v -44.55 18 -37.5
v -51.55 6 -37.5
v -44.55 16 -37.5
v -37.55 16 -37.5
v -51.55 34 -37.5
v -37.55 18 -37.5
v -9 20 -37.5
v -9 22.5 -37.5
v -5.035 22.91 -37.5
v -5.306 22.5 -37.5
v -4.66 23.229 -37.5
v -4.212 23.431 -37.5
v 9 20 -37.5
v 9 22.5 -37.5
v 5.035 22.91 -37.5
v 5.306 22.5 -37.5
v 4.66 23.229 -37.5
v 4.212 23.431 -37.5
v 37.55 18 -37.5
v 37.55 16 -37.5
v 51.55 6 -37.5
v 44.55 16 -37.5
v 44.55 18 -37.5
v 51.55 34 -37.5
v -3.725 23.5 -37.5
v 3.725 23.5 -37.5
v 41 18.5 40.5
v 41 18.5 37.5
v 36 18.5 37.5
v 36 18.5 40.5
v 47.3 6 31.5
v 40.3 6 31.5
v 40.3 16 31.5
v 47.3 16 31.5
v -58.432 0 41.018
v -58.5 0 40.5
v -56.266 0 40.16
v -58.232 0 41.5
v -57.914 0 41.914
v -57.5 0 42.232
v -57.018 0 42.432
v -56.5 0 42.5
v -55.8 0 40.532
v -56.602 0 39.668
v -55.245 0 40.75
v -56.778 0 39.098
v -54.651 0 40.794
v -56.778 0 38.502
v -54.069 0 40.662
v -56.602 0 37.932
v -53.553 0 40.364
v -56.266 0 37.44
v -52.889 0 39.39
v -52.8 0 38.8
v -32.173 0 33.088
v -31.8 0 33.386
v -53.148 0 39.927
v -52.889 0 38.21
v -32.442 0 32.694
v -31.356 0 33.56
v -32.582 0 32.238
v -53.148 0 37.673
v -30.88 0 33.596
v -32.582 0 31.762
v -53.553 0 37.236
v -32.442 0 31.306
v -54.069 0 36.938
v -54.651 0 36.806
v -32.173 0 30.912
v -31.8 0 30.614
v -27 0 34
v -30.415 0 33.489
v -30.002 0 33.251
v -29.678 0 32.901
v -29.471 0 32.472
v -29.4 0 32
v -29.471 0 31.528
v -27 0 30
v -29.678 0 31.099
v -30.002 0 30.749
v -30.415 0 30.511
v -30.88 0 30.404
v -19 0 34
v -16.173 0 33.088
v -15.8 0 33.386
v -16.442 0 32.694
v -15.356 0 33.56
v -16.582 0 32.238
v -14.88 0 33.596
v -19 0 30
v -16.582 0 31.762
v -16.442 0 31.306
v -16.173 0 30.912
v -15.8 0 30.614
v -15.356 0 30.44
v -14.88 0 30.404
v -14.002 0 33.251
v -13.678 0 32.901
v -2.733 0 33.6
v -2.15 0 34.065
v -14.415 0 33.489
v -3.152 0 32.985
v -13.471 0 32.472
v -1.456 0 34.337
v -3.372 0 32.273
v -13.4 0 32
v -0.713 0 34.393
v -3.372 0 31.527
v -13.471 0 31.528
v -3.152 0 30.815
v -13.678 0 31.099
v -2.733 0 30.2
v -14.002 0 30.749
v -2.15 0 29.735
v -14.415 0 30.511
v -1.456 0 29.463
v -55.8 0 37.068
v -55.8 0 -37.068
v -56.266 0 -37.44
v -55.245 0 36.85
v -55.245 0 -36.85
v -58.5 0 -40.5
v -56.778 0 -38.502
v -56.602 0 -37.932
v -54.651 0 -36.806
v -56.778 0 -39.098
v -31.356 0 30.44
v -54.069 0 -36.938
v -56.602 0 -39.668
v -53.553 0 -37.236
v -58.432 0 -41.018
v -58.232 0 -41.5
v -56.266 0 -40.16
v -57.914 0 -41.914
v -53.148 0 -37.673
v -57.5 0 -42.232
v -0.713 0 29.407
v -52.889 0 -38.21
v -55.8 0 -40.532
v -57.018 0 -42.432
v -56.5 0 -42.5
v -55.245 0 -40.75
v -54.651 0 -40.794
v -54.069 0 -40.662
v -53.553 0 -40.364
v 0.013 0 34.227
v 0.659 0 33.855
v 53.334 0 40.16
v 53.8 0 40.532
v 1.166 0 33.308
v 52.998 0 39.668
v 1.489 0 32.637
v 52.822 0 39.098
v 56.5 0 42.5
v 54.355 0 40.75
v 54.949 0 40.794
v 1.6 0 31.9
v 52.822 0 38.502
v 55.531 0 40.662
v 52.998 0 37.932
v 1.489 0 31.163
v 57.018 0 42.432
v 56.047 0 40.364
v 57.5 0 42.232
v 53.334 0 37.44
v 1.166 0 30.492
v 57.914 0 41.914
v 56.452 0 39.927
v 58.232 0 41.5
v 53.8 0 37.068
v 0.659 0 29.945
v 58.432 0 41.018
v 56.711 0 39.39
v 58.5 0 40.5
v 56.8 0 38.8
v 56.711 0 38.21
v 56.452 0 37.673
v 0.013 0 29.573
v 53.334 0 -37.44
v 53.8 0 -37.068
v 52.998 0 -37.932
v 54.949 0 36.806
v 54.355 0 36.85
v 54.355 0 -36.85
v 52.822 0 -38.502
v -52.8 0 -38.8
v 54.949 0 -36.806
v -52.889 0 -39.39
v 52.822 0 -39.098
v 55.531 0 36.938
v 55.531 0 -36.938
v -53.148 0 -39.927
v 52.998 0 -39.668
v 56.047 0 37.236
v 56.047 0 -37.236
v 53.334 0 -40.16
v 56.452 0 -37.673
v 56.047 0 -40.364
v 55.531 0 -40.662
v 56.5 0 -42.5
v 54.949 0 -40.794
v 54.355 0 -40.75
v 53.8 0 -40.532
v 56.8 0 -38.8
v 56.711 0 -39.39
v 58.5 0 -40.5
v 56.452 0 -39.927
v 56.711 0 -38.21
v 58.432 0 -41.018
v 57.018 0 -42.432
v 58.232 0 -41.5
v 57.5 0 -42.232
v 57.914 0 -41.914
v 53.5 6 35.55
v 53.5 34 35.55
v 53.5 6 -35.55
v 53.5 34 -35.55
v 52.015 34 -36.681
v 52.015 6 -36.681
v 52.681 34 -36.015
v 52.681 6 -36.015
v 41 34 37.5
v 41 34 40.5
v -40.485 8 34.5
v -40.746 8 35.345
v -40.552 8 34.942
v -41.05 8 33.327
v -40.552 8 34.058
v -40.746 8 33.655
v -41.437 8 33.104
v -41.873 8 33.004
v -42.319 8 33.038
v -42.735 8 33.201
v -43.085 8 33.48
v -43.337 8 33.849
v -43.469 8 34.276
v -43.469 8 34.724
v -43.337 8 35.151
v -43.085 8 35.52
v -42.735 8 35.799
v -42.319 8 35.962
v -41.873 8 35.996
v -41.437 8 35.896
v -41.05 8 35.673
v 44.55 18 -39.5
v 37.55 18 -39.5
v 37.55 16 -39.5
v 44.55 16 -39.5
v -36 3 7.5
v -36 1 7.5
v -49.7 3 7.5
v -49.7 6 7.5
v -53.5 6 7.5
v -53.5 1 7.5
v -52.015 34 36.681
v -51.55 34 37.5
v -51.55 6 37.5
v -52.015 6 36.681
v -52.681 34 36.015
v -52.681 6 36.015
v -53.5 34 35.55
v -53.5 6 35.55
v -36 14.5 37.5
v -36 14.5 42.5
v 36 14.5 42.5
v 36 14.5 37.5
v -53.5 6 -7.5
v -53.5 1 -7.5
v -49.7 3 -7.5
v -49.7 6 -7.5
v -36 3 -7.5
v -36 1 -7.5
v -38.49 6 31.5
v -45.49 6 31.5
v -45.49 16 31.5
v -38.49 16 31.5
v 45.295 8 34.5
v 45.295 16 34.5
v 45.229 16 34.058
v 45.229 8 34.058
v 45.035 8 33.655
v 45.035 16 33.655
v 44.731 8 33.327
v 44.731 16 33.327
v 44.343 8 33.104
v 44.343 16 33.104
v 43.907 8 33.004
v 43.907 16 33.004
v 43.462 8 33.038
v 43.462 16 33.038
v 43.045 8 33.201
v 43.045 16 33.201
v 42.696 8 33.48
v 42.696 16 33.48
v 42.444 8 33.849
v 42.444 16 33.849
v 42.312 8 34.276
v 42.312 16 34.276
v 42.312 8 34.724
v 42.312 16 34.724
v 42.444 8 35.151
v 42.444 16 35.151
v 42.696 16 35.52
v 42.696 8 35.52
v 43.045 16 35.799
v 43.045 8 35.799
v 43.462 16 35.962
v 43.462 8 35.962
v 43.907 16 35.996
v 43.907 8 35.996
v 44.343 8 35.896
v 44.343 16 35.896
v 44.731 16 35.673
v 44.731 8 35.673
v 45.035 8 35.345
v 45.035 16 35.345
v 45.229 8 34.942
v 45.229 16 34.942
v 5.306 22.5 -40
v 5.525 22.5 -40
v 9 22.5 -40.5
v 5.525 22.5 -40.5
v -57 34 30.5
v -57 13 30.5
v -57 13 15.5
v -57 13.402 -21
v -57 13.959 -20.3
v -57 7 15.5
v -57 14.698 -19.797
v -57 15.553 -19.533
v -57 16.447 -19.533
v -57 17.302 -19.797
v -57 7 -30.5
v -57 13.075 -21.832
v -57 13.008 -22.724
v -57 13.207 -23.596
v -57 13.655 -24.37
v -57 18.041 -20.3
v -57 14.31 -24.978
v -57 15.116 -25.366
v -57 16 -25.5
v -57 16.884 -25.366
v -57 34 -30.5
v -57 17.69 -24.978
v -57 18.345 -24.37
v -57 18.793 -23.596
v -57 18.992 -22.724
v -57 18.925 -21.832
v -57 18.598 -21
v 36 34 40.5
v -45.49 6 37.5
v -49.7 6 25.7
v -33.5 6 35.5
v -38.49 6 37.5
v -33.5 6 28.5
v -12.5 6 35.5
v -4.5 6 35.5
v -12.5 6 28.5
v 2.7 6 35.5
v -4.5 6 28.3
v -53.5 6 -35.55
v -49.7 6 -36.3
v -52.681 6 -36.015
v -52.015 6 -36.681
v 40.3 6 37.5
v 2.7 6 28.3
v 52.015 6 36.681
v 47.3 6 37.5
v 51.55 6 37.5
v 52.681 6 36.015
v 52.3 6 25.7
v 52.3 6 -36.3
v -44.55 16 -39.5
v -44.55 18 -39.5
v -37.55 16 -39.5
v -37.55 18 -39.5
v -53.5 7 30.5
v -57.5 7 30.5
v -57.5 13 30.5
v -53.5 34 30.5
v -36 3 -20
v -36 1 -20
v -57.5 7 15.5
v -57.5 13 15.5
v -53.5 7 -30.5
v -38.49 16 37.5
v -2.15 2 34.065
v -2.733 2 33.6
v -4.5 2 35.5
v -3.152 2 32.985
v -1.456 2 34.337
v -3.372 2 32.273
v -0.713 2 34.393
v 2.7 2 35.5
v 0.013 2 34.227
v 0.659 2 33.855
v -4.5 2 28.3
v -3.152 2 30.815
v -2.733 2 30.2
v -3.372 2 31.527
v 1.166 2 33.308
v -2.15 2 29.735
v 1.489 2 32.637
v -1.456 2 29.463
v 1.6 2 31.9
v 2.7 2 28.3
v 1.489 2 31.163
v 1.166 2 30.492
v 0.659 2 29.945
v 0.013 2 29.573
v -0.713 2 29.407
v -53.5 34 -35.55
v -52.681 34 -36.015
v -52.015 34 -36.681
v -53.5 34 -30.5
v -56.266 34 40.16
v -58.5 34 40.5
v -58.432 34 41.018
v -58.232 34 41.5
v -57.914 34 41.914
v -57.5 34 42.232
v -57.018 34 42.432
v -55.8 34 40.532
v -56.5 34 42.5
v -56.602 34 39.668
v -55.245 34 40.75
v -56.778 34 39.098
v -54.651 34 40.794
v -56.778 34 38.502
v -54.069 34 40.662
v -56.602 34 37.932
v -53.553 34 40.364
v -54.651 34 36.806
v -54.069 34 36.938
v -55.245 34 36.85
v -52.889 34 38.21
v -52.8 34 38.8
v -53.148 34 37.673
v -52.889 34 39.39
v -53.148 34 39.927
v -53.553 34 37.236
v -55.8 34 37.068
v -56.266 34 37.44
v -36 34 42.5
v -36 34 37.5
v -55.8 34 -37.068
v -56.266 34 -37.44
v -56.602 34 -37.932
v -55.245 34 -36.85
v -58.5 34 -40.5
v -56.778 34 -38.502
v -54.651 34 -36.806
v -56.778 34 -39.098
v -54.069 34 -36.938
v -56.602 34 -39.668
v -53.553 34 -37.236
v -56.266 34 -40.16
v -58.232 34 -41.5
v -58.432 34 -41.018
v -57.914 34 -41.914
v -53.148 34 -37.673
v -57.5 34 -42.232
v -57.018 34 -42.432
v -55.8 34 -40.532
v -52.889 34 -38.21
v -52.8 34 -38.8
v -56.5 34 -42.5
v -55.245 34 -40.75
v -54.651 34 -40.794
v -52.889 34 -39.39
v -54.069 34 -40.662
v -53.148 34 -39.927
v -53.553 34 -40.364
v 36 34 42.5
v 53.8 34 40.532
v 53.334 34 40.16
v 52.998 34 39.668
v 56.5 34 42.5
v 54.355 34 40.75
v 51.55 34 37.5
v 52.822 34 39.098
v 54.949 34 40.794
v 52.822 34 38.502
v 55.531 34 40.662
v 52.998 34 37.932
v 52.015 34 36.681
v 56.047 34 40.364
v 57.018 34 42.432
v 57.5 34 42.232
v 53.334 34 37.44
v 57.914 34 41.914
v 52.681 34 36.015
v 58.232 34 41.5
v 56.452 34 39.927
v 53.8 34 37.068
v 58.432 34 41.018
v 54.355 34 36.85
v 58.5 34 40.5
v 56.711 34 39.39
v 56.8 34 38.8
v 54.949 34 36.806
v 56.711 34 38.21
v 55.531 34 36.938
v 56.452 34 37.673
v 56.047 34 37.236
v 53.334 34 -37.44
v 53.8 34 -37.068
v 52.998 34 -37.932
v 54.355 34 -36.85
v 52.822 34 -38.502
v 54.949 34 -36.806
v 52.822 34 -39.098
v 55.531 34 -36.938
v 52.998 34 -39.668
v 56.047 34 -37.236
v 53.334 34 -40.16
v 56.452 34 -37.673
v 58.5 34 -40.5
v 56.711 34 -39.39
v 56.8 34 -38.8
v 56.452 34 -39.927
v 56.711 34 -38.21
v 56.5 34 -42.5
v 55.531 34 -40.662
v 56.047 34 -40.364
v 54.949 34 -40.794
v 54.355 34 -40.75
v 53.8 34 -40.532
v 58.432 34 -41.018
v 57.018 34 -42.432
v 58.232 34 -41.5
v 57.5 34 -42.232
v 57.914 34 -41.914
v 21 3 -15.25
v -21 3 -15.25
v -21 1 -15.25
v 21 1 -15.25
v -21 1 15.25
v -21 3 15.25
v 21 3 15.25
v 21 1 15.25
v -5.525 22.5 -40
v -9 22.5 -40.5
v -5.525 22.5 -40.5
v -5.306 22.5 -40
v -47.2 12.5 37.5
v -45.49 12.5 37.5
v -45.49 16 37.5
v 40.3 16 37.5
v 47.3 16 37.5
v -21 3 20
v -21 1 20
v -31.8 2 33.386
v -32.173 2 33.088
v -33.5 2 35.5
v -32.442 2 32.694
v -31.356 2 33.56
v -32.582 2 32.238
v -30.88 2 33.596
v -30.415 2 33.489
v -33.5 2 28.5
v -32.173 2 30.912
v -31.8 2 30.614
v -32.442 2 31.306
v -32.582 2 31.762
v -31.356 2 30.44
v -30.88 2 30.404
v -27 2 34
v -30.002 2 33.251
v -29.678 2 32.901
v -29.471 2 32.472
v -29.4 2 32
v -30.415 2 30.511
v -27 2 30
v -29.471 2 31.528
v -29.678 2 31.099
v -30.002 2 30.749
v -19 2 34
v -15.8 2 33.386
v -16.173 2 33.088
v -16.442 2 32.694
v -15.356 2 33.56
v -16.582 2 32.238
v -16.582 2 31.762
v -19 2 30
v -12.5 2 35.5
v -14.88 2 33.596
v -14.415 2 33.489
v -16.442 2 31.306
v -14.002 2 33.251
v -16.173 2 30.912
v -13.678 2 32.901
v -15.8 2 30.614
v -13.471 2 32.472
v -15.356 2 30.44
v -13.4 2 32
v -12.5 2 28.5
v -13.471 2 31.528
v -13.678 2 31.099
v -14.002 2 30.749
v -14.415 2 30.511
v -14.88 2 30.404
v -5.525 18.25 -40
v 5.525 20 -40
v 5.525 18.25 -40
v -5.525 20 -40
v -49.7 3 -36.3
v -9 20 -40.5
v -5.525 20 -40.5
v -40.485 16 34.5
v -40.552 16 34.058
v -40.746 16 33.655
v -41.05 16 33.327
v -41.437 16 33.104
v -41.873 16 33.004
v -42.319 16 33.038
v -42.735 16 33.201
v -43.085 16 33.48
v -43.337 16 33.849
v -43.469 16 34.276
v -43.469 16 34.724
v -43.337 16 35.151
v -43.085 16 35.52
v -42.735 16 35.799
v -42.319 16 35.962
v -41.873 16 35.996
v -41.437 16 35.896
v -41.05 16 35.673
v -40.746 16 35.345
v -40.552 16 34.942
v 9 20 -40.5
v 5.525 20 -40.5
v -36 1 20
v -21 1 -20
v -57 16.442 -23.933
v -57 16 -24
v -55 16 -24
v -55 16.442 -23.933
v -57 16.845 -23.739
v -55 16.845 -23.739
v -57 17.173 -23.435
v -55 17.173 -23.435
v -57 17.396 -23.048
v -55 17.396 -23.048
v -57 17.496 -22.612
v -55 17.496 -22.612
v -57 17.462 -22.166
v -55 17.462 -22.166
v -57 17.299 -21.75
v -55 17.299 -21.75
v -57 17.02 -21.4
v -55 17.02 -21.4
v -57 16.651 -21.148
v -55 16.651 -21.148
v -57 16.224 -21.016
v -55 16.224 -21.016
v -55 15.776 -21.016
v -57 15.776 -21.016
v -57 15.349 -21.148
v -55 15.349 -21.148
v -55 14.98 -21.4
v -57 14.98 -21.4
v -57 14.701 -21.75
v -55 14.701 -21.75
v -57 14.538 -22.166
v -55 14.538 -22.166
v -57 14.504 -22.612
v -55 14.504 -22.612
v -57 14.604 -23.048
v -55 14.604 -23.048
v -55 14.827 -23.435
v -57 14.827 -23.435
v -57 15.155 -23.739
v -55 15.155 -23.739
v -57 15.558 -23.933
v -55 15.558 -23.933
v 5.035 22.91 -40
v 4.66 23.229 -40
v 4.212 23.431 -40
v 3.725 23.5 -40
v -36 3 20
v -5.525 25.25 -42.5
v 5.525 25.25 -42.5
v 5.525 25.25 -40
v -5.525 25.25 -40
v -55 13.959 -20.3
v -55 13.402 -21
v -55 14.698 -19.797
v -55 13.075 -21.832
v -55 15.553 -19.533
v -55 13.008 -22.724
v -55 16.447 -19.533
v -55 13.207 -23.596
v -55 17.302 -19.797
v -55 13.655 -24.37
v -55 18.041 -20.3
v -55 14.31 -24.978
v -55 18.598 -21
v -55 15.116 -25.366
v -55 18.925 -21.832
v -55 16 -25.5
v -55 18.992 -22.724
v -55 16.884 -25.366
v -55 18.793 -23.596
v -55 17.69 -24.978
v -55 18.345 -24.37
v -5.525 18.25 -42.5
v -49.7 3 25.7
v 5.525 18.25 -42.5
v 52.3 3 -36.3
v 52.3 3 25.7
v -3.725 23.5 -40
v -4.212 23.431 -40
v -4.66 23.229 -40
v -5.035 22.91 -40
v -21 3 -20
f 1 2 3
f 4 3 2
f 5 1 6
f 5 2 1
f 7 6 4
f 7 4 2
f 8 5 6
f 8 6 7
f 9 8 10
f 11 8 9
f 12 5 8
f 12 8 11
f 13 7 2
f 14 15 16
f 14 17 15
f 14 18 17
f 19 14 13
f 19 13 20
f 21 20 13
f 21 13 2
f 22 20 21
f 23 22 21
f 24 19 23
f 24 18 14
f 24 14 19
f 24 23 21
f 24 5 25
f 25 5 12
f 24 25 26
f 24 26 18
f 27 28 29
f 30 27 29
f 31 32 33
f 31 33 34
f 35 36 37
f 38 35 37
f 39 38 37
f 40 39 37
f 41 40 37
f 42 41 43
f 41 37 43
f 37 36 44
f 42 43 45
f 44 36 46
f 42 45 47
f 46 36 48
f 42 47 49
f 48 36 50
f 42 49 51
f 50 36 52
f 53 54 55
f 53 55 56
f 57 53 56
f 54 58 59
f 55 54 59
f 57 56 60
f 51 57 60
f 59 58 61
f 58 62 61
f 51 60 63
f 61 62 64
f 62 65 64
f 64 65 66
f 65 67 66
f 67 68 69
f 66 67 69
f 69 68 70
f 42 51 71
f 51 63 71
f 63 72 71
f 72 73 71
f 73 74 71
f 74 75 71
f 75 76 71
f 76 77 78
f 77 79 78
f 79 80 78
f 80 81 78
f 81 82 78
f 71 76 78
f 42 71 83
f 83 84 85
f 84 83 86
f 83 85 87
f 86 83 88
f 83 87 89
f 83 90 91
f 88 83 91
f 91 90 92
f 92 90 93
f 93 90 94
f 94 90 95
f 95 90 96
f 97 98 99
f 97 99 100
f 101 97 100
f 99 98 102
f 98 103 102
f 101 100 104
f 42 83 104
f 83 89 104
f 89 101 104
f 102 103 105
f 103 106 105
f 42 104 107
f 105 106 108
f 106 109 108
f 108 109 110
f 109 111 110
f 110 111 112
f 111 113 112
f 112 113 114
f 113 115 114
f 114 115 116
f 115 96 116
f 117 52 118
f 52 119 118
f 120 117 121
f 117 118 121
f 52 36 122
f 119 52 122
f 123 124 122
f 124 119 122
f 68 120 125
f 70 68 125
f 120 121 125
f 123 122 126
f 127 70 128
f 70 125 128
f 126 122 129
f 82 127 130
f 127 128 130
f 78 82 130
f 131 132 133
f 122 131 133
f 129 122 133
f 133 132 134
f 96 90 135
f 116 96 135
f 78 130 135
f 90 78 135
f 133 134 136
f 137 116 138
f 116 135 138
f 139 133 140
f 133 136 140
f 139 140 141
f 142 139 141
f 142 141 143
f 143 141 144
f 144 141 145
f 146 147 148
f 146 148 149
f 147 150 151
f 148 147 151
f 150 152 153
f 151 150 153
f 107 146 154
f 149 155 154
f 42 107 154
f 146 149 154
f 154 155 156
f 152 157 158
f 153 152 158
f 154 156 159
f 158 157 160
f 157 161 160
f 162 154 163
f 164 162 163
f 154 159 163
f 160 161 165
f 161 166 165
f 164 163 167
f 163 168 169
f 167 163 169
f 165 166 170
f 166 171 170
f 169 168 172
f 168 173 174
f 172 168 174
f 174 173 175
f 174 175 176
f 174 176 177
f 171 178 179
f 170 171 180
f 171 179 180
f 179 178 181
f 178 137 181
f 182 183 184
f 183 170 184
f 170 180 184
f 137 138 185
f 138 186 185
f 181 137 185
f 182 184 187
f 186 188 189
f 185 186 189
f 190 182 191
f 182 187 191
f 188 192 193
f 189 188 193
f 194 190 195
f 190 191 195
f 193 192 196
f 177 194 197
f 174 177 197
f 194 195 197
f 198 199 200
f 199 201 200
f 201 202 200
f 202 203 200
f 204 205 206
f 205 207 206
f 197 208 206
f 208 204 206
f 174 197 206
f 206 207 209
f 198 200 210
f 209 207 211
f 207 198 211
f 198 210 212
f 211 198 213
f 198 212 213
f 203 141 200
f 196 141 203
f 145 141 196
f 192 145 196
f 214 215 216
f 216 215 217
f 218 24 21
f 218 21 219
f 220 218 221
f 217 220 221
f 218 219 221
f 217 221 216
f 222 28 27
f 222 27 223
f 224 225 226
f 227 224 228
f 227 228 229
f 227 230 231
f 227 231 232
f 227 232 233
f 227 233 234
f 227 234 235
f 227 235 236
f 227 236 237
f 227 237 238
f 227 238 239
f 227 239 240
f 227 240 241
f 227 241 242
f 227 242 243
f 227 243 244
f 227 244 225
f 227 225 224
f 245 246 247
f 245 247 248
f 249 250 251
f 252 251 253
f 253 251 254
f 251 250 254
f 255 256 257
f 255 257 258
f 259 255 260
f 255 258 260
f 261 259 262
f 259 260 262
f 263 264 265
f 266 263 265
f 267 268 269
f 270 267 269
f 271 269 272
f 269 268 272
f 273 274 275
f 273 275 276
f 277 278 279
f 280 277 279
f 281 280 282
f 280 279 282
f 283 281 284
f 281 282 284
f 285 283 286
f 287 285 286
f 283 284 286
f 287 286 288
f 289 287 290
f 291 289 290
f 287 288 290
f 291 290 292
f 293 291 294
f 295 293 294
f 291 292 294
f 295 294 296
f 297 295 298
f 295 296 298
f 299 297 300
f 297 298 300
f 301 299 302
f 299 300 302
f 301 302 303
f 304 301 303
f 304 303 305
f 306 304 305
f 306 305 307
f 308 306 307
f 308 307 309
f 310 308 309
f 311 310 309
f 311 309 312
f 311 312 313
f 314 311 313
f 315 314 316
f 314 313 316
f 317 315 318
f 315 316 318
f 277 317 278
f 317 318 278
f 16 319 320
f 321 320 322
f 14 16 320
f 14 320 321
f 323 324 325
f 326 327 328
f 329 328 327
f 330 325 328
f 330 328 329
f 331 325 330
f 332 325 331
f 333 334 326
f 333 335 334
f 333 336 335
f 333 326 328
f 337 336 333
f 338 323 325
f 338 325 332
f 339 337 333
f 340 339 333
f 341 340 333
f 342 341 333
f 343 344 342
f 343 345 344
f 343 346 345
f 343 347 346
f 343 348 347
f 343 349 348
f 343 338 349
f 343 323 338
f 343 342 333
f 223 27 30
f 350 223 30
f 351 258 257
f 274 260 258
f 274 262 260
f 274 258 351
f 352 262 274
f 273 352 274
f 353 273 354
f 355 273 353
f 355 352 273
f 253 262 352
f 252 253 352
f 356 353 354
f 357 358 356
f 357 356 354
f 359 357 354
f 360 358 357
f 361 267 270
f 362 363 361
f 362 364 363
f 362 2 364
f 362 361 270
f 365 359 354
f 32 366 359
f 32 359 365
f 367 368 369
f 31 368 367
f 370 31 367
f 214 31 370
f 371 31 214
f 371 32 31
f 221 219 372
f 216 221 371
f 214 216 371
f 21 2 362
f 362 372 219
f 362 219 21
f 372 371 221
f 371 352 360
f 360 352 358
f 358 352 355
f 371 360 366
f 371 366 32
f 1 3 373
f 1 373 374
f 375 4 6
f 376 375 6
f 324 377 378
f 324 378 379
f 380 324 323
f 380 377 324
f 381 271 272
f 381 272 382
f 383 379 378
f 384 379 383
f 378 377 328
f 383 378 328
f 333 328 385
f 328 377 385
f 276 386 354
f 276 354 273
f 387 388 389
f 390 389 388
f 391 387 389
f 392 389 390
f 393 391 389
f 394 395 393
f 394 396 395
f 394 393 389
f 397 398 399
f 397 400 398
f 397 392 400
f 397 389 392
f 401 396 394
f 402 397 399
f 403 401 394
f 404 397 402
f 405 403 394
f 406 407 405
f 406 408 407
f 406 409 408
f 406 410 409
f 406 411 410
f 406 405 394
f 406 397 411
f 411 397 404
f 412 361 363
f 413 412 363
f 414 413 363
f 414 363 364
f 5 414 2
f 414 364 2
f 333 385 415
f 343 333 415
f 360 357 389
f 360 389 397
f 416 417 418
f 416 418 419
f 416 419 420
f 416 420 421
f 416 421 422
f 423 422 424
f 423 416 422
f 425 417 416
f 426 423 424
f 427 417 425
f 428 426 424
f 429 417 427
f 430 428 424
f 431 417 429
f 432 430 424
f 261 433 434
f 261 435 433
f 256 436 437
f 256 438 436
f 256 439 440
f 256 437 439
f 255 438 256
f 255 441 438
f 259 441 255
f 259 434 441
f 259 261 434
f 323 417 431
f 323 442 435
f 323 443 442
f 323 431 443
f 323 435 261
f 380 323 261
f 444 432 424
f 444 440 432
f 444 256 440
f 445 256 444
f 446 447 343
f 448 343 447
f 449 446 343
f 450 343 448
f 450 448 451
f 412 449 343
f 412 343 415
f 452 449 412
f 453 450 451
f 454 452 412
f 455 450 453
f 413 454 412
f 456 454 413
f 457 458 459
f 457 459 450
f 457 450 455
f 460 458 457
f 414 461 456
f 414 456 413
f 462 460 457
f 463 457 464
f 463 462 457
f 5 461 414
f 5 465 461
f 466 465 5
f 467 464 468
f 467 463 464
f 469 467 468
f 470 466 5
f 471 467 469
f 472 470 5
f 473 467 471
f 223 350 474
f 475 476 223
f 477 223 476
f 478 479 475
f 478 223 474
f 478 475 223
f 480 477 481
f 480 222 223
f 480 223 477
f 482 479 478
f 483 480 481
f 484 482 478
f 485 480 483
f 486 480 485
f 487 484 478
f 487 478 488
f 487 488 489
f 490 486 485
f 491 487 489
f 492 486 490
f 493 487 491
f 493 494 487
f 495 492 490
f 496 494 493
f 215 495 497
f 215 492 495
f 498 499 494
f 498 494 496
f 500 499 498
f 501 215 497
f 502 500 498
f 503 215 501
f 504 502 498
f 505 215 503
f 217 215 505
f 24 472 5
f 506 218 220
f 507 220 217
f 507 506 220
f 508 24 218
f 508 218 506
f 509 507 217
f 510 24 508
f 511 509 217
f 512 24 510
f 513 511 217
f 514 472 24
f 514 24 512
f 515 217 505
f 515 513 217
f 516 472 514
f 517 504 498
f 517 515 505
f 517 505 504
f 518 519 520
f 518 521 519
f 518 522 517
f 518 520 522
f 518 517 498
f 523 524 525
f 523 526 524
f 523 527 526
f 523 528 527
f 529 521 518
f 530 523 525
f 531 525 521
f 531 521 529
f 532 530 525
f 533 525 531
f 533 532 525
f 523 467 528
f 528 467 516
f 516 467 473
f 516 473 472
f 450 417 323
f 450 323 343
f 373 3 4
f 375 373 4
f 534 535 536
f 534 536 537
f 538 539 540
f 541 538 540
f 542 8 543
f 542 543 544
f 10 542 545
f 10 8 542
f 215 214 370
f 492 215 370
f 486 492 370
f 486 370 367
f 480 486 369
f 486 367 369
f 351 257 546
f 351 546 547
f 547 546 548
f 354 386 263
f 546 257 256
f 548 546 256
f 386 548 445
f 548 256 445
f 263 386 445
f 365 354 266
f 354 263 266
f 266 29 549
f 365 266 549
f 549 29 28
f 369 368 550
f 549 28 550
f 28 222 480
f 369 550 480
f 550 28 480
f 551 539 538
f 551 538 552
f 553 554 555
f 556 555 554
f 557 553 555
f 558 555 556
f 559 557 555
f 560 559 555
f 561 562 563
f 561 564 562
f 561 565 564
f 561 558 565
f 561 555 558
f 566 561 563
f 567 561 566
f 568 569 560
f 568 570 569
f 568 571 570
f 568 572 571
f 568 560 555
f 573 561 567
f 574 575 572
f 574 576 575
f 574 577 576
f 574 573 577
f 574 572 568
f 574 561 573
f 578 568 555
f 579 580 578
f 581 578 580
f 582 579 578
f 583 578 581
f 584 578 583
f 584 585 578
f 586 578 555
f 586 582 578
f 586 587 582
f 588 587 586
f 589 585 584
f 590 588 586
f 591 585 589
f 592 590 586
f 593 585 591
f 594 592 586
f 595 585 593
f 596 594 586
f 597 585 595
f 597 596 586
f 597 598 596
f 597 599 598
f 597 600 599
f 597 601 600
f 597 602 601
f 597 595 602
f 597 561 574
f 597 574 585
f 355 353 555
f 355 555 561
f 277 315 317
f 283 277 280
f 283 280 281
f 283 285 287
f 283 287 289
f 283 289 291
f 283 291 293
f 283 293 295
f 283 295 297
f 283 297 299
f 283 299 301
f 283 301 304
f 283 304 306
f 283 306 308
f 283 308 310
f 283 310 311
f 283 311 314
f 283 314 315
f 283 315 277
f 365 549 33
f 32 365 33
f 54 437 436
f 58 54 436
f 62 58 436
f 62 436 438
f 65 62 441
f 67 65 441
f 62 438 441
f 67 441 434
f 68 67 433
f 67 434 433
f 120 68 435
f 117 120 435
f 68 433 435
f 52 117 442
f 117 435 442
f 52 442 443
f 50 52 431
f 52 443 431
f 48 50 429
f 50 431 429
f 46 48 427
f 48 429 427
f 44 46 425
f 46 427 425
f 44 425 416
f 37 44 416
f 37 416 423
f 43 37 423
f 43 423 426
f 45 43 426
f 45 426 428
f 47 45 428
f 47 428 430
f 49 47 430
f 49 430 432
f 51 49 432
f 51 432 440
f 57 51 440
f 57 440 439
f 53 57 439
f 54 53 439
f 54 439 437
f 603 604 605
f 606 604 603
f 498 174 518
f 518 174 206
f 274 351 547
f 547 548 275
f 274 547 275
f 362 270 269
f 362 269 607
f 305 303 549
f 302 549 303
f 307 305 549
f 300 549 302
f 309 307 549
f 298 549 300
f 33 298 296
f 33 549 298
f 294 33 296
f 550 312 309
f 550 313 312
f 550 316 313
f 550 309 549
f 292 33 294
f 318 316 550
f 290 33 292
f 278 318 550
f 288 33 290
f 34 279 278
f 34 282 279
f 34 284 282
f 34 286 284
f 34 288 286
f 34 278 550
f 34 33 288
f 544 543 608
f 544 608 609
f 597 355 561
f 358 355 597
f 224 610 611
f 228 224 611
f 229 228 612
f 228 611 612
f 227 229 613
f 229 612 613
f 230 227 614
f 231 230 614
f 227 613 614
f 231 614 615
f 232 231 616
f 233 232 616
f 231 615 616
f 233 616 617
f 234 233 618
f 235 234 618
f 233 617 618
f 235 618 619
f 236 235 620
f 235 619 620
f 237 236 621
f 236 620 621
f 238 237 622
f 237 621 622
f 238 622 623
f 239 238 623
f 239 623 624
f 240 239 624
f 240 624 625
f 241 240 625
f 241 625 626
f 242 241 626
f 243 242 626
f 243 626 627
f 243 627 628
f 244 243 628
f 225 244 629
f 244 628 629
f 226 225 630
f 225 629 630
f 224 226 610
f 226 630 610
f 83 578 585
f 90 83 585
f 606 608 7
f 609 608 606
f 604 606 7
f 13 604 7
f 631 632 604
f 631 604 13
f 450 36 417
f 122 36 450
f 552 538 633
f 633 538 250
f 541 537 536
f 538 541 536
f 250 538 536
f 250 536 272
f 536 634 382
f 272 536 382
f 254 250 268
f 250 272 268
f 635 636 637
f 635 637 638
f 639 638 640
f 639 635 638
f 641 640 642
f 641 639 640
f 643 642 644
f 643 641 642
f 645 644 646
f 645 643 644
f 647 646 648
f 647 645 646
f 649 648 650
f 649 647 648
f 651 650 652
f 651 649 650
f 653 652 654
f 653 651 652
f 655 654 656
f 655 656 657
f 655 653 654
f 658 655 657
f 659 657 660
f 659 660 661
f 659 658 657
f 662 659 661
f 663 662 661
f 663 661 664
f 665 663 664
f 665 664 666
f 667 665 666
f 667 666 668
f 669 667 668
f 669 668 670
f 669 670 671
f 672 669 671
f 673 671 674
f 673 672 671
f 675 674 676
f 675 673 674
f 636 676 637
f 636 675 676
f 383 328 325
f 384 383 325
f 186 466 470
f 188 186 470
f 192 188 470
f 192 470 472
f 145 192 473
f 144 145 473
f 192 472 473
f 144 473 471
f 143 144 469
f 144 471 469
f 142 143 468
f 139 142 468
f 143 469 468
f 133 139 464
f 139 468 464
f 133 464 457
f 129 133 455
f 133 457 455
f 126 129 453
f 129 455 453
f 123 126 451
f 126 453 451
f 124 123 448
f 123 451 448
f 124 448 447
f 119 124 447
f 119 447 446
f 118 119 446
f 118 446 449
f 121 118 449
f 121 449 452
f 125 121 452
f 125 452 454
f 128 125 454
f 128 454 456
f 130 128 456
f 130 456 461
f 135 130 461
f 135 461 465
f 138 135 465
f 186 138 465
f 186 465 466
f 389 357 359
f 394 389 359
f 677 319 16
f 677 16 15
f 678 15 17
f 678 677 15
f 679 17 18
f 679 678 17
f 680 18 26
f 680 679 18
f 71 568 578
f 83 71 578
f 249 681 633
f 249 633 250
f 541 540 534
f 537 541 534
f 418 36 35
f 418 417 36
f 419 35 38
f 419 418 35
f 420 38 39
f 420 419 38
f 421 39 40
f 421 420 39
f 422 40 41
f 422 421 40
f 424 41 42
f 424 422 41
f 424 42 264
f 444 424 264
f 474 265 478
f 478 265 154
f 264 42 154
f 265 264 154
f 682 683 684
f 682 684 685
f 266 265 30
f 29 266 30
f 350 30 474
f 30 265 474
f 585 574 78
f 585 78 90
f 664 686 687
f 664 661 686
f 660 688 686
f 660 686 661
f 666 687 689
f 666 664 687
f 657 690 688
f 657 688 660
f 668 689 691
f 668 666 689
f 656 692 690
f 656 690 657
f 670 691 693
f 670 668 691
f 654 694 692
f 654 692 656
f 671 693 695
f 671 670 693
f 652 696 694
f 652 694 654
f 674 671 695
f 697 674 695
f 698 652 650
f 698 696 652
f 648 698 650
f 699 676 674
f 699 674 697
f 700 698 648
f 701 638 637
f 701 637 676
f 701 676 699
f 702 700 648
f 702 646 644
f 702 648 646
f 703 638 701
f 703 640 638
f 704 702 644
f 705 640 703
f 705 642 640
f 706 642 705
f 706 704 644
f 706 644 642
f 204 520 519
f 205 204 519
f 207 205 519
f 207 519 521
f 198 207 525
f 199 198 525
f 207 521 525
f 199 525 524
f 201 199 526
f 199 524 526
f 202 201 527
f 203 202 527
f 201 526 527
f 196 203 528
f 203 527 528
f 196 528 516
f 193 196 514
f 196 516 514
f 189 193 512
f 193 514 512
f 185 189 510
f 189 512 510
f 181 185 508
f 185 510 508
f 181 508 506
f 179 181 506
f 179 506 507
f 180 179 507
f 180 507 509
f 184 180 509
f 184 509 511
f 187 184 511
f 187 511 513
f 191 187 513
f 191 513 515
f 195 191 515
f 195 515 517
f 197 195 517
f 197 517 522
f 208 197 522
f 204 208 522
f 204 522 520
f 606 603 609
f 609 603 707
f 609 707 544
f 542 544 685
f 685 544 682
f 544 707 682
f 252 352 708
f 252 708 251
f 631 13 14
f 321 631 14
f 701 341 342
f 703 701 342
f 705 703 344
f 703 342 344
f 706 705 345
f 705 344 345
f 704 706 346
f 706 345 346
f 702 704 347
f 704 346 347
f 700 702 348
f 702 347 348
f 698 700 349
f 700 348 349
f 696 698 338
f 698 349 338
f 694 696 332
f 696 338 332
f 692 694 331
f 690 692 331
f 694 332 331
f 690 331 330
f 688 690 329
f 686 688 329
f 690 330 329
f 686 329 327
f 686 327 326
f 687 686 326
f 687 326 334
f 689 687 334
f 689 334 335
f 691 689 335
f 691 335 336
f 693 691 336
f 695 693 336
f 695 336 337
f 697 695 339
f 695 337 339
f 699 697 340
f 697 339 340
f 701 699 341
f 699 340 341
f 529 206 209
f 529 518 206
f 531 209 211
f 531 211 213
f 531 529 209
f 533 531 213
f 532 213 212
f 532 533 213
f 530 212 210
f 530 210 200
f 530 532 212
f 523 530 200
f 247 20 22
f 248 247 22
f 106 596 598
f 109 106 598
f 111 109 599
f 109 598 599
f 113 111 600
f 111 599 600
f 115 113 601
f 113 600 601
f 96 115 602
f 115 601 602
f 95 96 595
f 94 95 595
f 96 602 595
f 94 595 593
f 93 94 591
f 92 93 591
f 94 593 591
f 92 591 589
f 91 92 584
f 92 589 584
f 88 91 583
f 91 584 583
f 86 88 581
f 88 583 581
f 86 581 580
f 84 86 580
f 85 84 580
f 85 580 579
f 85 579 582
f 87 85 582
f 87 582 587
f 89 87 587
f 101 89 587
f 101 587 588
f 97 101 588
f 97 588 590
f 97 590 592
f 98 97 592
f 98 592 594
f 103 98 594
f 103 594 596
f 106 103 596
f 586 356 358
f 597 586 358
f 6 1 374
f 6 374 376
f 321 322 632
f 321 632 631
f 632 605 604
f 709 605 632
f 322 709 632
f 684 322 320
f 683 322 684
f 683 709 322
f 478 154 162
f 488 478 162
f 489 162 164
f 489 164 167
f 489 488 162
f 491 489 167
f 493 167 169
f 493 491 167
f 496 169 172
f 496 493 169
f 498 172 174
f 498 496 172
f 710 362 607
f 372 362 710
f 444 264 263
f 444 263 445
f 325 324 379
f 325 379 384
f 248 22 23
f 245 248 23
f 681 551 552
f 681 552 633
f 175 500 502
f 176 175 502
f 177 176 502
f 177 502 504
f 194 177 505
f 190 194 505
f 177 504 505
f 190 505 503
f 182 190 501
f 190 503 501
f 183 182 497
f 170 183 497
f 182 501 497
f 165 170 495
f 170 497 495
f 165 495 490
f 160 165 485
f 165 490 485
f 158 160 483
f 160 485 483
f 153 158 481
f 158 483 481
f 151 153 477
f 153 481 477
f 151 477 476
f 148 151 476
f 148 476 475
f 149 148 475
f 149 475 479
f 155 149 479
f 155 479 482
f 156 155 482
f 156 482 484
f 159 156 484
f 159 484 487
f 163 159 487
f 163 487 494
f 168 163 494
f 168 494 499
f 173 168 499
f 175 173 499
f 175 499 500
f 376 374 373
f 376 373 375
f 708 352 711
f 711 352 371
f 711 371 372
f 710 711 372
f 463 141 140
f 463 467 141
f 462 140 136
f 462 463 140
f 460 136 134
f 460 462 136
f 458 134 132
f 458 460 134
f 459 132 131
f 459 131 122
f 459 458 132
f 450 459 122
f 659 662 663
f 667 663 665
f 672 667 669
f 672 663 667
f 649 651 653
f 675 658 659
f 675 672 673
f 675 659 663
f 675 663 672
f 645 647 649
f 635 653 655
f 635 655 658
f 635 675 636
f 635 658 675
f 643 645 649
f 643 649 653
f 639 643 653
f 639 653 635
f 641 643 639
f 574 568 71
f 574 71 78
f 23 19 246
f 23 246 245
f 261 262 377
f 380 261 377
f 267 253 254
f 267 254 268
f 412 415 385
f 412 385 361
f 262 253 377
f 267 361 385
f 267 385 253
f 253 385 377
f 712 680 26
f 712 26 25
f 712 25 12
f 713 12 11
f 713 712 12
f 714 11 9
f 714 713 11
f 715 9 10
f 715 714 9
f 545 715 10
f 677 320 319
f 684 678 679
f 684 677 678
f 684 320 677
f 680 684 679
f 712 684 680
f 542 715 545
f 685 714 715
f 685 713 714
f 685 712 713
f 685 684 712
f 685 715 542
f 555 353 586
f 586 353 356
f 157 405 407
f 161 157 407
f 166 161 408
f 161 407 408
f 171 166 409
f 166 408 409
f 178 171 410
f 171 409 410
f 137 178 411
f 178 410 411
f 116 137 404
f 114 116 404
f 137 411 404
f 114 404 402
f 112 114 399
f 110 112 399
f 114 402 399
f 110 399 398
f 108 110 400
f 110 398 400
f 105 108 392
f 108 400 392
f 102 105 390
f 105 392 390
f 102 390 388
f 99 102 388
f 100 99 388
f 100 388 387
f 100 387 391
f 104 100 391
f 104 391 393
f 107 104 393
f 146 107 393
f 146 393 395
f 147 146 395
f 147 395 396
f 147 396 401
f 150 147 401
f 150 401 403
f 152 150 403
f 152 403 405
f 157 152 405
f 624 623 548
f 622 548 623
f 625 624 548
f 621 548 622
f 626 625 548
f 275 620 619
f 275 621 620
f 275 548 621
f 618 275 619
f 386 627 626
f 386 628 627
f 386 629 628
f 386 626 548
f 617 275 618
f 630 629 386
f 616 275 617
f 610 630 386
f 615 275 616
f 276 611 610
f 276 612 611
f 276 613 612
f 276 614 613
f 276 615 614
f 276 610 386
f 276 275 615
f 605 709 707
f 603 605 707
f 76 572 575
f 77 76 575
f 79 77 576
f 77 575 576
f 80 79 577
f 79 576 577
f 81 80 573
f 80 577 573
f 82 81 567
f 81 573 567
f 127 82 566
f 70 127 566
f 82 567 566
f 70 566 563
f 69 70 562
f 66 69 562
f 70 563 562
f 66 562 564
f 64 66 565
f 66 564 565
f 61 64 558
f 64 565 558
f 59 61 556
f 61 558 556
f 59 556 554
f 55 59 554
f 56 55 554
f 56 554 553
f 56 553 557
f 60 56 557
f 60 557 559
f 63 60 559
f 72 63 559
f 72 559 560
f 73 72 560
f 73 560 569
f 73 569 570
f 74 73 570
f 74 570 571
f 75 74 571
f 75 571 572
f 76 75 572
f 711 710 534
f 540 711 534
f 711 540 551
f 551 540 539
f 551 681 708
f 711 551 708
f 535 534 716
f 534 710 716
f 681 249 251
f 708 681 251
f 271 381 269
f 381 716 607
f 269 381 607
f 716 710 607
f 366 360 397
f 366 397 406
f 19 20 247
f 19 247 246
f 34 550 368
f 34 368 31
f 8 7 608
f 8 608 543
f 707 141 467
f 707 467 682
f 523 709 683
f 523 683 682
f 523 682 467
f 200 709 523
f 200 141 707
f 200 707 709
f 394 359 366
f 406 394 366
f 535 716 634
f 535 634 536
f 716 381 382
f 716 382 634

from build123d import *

# Parameters (mm, degrees)
SKETCH1_W                = 117
SKETCH1_H                = 85
BOSS_EXTRUDE1_DEPTH      = 34
SKETCH2_W                = 107
SKETCH2_H                = 75
CUT_EXTRUDE1_DEPTH       = 28
SKETCH3_R                = 2
CUT_EXTRUDE2_DEPTH       = 28
CUT_EXTRUDE2_DEPTH_BACK  = 28
SKETCH11_R               = 3.5
BOSS_EXTRUDE3_DEPTH      = 28
SKETCH13_R               = 2
CUT_EXTRUDE9_DEPTH       = 35
SKETCH14_W               = 102
SKETCH14_H               = 62
CUT_EXTRUDE10_DEPTH      = 3
SKETCH15_W               = 61
SKETCH15_H               = 40
CUT_EXTRUDE11_DEPTH      = 3.5
SKETCH16_W               = 15
SKETCH16_H               = 6
CUT_EXTRUDE12_DEPTH      = 0.5
CUT_EXTRUDE13_DEPTH      = 5
SKETCH20_W               = 72
SKETCH20_H               = 25
CUT_EXTRUDE14_DEPTH      = 5
SKETCH21_W               = 7
SKETCH21_H               = 2
CUT_EXTRUDE15_DEPTH      = 2
SKETCH22_W               = 7
SKETCH22_H               = 2
BOSS_EXTRUDE5_DEPTH      = 2.5
SKETCH23_W               = 3
SKETCH23_H               = 1.5
BOSS_EXTRUDE6_DEPTH      = 2.5
CUT_EXTRUDE17_DEPTH      = 92.5
SKETCH38_W               = 21
SKETCH38_H               = 7
CUT_EXTRUDE22_DEPTH      = 4
SKETCH39_R               = 1.6
SKETCH39_W               = 8
SKETCH39_H               = 4
CUT_EXTRUDE23_DEPTH      = 33
CUT_EXTRUDE23_DEPTH_BACK = 3
SKETCH40_W               = 7.2
SKETCH40_H               = 7.2
CUT_EXTRUDE24_DEPTH      = 4
SKETCH41_R               = 2.5
CUT_EXTRUDE25_DEPTH      = 4
FILLET5_R                = 2
FILLET6_R                = 2
FILLET7_R                = 2
FILLET8_R                = 2
SKETCH6_W                = 42
SKETCH6_H                = 30.5
CUT_EXTRUDE26_DEPTH      = 5
CUT_EXTRUDE27_DEPTH      = 5
CUT_EXTRUDE27_DEPTH_BACK = 2
SKETCH43_R               = 3
SKETCH43_R_2             = 1.5
BOSS_EXTRUDE7_DEPTH      = 2
SKETCH44_W               = 5
SKETCH44_H               = 15.5
CUT_EXTRUDE28_DEPTH      = 3
SKETCH45_W               = 18
SKETCH45_H               = 2.5
CUT_EXTRUDE29_DEPTH      = 3
SKETCH47_W               = 11.05
SKETCH47_H               = 7
CUT_EXTRUDE30_DEPTH      = 2.5
SKETCH48_W               = 7
SKETCH48_H               = 6
BOSS_EXTRUDE8_DEPTH      = 10
SKETCH49_W               = 7
SKETCH49_H               = 6
BOSS_EXTRUDE9_DEPTH      = 10
SKETCH51_R               = 1.5
CUT_EXTRUDE31_DEPTH      = 8
SKETCH50_R               = 1.5
CUT_EXTRUDE32_DEPTH      = 8


with BuildPart() as part:
    # Sketch1 → Boss-Extrude1 (new body)
    with BuildSketch(Plane(origin=(0, 0, 0), x_dir=(1, 0, 0), z_dir=(0, 1, 0))):
        Rectangle(SKETCH1_W, SKETCH1_H)
    extrude(amount=BOSS_EXTRUDE1_DEPTH)

    # Sketch2 → Cut-Extrude1 (cut)
    with BuildSketch(Plane(origin=(0, 34, 0), x_dir=(1, 0, 0), z_dir=(0, 1, 0))):
        Rectangle(SKETCH2_W, SKETCH2_H)
    extrude(amount=-CUT_EXTRUDE1_DEPTH, mode=Mode.SUBTRACT)

    # Sketch3 → Cut-Extrude2 (cut, two sides)
    with BuildSketch(Plane(origin=(0, 6, 0), x_dir=(1, 0, 0), z_dir=(0, 1, 0))) as cut_extrude2_sk:
        with Locations((54.8, -38.8)):
            Circle(SKETCH3_R)
        with Locations((54.8, 38.8)):
            Circle(SKETCH3_R)
        with Locations((-54.8, 38.8)):
            Circle(SKETCH3_R)
        with Locations((-54.8, -38.8)):
            Circle(SKETCH3_R)
    extrude(amount=CUT_EXTRUDE2_DEPTH, mode=Mode.SUBTRACT)
    extrude(cut_extrude2_sk.sketch, amount=-CUT_EXTRUDE2_DEPTH_BACK, mode=Mode.SUBTRACT)

    # Sketch11 → Boss-Extrude3 (add)
    with BuildSketch(Plane(origin=(0, 6, 0), x_dir=(1, 0, 0), z_dir=(0, 1, 0))):
        with Locations((-54.8, -38.8)):
            Circle(SKETCH11_R)
        with Locations((-54.8, 38.8)):
            Circle(SKETCH11_R)
        with Locations((54.8, -38.8)):
            Circle(SKETCH11_R)
        with Locations((54.8, 38.8)):
            Circle(SKETCH11_R)
    extrude(amount=BOSS_EXTRUDE3_DEPTH)

    # Sketch13 → Cut-Extrude9 (cut, through all)
    with BuildSketch(Plane(origin=(0, 34, 0), x_dir=(1, 0, 0), z_dir=(0, 1, 0))):
        with Locations((-54.8, 38.8)):
            Circle(SKETCH13_R)
        with Locations((54.8, 38.8)):
            Circle(SKETCH13_R)
        with Locations((-54.8, -38.8)):
            Circle(SKETCH13_R)
        with Locations((54.8, -38.8)):
            Circle(SKETCH13_R)
    extrude(amount=-CUT_EXTRUDE9_DEPTH, mode=Mode.SUBTRACT)

    # Sketch14 → Cut-Extrude10 (cut)
    with BuildSketch(Plane(origin=(0, 6, 0), x_dir=(1, 0, 0), z_dir=(0, 1, 0))):
        with Locations((1.3, 5.3)):
            Rectangle(SKETCH14_W, SKETCH14_H)
    extrude(amount=-CUT_EXTRUDE10_DEPTH, mode=Mode.SUBTRACT)

    # Sketch15 → Cut-Extrude11 (cut)
    with BuildSketch(Plane(origin=(-53.5, 0, 0), x_dir=(0, 0, -1), z_dir=(1, 0, 0))):
        with Locations((-0.000384638, 27)):
            Rectangle(SKETCH15_W, SKETCH15_H)
    extrude(amount=-CUT_EXTRUDE11_DEPTH, mode=Mode.SUBTRACT)

    # Sketch16 → Cut-Extrude12 (cut)
    with BuildSketch(Plane(origin=(-57, 0, 0), x_dir=(0, 0, -1), z_dir=(1, 0, 0))):
        with Locations((-23.000384638, 10)):
            Rectangle(SKETCH16_W, SKETCH16_H)
    extrude(amount=-CUT_EXTRUDE12_DEPTH, mode=Mode.SUBTRACT)

    # Sketch18 → Cut-Extrude13 (cut)
    with BuildSketch(Plane(origin=(0, 0, -42.5), x_dir=(-1, 0, 0), z_dir=(0, 0, -1))):
        with BuildLine():
            Line((-3.725, 23.5), (3.725, 23.5))
            ThreePointArc((3.725, 23.5), (5.475, 21.75), (3.725, 20))
            Line((3.725, 20), (-3.725, 20))
            ThreePointArc((-3.725, 20), (-5.475, 21.75), (-3.725, 23.5))
        make_face()
    extrude(amount=-CUT_EXTRUDE13_DEPTH, mode=Mode.SUBTRACT)

    # Sketch20 → Cut-Extrude14 (cut)
    with BuildSketch(Plane.XY.offset(42.5)):
        with Locations((0, 27)):
            Rectangle(SKETCH20_W, SKETCH20_H)
    extrude(amount=-CUT_EXTRUDE14_DEPTH, mode=Mode.SUBTRACT)

    # Sketch21 → Cut-Extrude15 (cut)
    with BuildSketch(Plane.XY.offset(-37.5)):
        with Locations((-41.050384638, 17)):
            Rectangle(SKETCH21_W, SKETCH21_H)
        with Locations((41.050384638, 17)):
            Rectangle(SKETCH21_W, SKETCH21_H)
    extrude(amount=-CUT_EXTRUDE15_DEPTH, mode=Mode.SUBTRACT)

    # Sketch22 → Boss-Extrude5 (add)
    with BuildSketch(Plane(origin=(0, 0, 37.5), x_dir=(-1, 0, 0), z_dir=(0, 0, -1))):
        with Locations((-43.800384638, 15)):
            Rectangle(SKETCH22_W, SKETCH22_H)
        with Locations((41.990384638, 15)):
            Rectangle(SKETCH22_W, SKETCH22_H)
    extrude(amount=BOSS_EXTRUDE5_DEPTH)

    # Sketch23 → Boss-Extrude6 (add)
    with BuildSketch(Plane(origin=(0, 0, 37.5), x_dir=(-1, 0, 0), z_dir=(0, 0, -1))):
        with Locations((-43.800384638, 13.25)):
            Rectangle(SKETCH23_W, SKETCH23_H)
        with Locations((43.800384638, 13.25)):
            Rectangle(SKETCH23_W, SKETCH23_H)
    extrude(amount=BOSS_EXTRUDE6_DEPTH)

    # Sketch25 → Cut-Extrude17 (cut)
    with BuildSketch(Plane(origin=(45.300384638, 0, 0), x_dir=(0, 0, -1), z_dir=(1, 0, 0))):
        Polygon((-35, 14), (-37.5, 12.5), (-35, 12.5), align=None)
    extrude(amount=-CUT_EXTRUDE17_DEPTH, mode=Mode.SUBTRACT)

    # Sketch38 → Cut-Extrude22 (cut)
    with BuildSketch(Plane(origin=(0, 6, 0), x_dir=(1, 0, 0), z_dir=(0, 1, 0))):
        with Locations((-23, -32)):
            Rectangle(SKETCH38_W, SKETCH38_H)
    extrude(amount=-CUT_EXTRUDE22_DEPTH, mode=Mode.SUBTRACT)

    # Sketch39 → Cut-Extrude23 (cut, two sides)
    with BuildSketch(Plane(origin=(0, 2, 0), x_dir=(1, 0, 0), z_dir=(0, 1, 0))) as cut_extrude23_sk:
        with Locations((-31, -32)):
            Circle(SKETCH39_R)
        with Locations((-15, -32)):
            Circle(SKETCH39_R)
        with Locations((-23, -32)):
            Rectangle(SKETCH39_W, SKETCH39_H)
    extrude(amount=CUT_EXTRUDE23_DEPTH, mode=Mode.SUBTRACT)
    extrude(cut_extrude23_sk.sketch, amount=-CUT_EXTRUDE23_DEPTH_BACK, mode=Mode.SUBTRACT)

    # Sketch40 → Cut-Extrude24 (cut)
    with BuildSketch(Plane(origin=(0, 6, 0), x_dir=(1, 0, 0), z_dir=(0, 1, 0))):
        with Locations((-0.9, -31.9)):
            Rectangle(SKETCH40_W, SKETCH40_H)
    extrude(amount=-CUT_EXTRUDE24_DEPTH, mode=Mode.SUBTRACT)

    # Sketch41 → Cut-Extrude25 (cut)
    with BuildSketch(Plane(origin=(0, 2, 0), x_dir=(1, 0, 0), z_dir=(0, 1, 0))):
        with Locations((-0.9, -31.9)):
            Circle(SKETCH41_R)
    extrude(amount=-CUT_EXTRUDE25_DEPTH, mode=Mode.SUBTRACT)

    # Fillet5
    fillet5_edges = [part.edges().sort_by_distance(p)[0] for p in [
        (-58.5, 17, 42.5),
    ]]
    fillet(fillet5_edges, radius=FILLET5_R)

    # Fillet6
    fillet6_edges = [part.edges().sort_by_distance(p)[0] for p in [
        (58.5, 17, 42.5),
    ]]
    fillet(fillet6_edges, radius=FILLET6_R)

    # Fillet7
    fillet7_edges = [part.edges().sort_by_distance(p)[0] for p in [
        (58.5, 17, -42.5),
    ]]
    fillet(fillet7_edges, radius=FILLET7_R)

    # Fillet8
    fillet8_edges = [part.edges().sort_by_distance(p)[0] for p in [
        (-58.5, 17, -42.5),
    ]]
    fillet(fillet8_edges, radius=FILLET8_R)

    # Sketch6 → Cut-Extrude26 (cut)
    with BuildSketch(Plane(origin=(22.627458043, 6, 6.502354234), x_dir=(1, 0, 0), z_dir=(0, 1, 0))):
        with Locations((-22.627458043, 6.502354234)):
            Rectangle(SKETCH6_W, SKETCH6_H)
    extrude(amount=-CUT_EXTRUDE26_DEPTH, mode=Mode.SUBTRACT)

    # Sketch42 → Cut-Extrude27 (cut, two sides)
    with BuildSketch(Plane(origin=(0, 3, 0), x_dir=(1, 0, 0), z_dir=(0, 1, 0))) as cut_extrude27_sk:
        Polygon((-21, -20), (-36, -20), (-36, -7.5), (-53.5, -7.5), (-53.5, 7.5), (-36, 7.5), (-36, 20), (-21, 20), align=None)
    extrude(amount=CUT_EXTRUDE27_DEPTH, mode=Mode.SUBTRACT)
    extrude(cut_extrude27_sk.sketch, amount=-CUT_EXTRUDE27_DEPTH_BACK, mode=Mode.SUBTRACT)

    # Sketch43 → Boss-Extrude7 (add)
    with BuildSketch(Plane(origin=(-57, 0, 0), x_dir=(0, 0, -1), z_dir=(1, 0, 0))):
        with Locations((22.499615362, 16)):
            Circle(SKETCH43_R)
        with Locations((22.499615362, 16)):
            Circle(SKETCH43_R_2, mode=Mode.SUBTRACT)
    extrude(amount=BOSS_EXTRUDE7_DEPTH)

    # Sketch44 → Cut-Extrude28 (cut)
    with BuildSketch(Plane(origin=(0, 0, 37.5), x_dir=(-1, 0, 0), z_dir=(0, 0, -1))):
        with Locations((-38.5, 26.25)):
            Rectangle(SKETCH44_W, SKETCH44_H)
    extrude(amount=-CUT_EXTRUDE28_DEPTH, mode=Mode.SUBTRACT)

    # Sketch45 → Cut-Extrude29 (cut)
    with BuildSketch(Plane.XY.offset(-37.5)):
        with Locations((0, 21.25)):
            Rectangle(SKETCH45_W, SKETCH45_H)
    extrude(amount=-CUT_EXTRUDE29_DEPTH, mode=Mode.SUBTRACT)

    # Sketch47 → Cut-Extrude30 (cut)
    with BuildSketch(Plane(origin=(0, 0, -42.5), x_dir=(-1, 0, 0), z_dir=(0, 0, -1))):
        with Locations((0, 21.75)):
            Rectangle(SKETCH47_W, SKETCH47_H)
    extrude(amount=-CUT_EXTRUDE30_DEPTH, mode=Mode.SUBTRACT)

    # Sketch48 → Boss-Extrude8 (add)
    with BuildSketch(Plane(origin=(0, 16, 0), x_dir=(1, 0, 0), z_dir=(0, 1, 0))):
        with Locations((43.800384638, -34.5)):
            Rectangle(SKETCH48_W, SKETCH48_H)
    extrude(amount=-BOSS_EXTRUDE8_DEPTH)

    # Sketch49 → Boss-Extrude9 (add)
    with BuildSketch(Plane(origin=(0, 16, 0), x_dir=(1, 0, 0), z_dir=(0, 1, 0))):
        with Locations((-41.990384638, -34.5)):
            Rectangle(SKETCH49_W, SKETCH49_H)
    extrude(amount=-BOSS_EXTRUDE9_DEPTH)

    # Sketch51 → Cut-Extrude31 (cut)
    with BuildSketch(Plane(origin=(0, 16, 0), x_dir=(1, 0, 0), z_dir=(0, 1, 0))):
        with Locations((-41.985384638, -34.5)):
            Circle(SKETCH51_R)
    extrude(amount=-CUT_EXTRUDE31_DEPTH, mode=Mode.SUBTRACT)

    # Sketch50 → Cut-Extrude32 (cut)
    with BuildSketch(Plane(origin=(0, 16, 0), x_dir=(1, 0, 0), z_dir=(0, 1, 0))):
        with Locations((43.795384638, -34.5)):
            Circle(SKETCH50_R)
    extrude(amount=-CUT_EXTRUDE32_DEPTH, mode=Mode.SUBTRACT)


solid = part.part
